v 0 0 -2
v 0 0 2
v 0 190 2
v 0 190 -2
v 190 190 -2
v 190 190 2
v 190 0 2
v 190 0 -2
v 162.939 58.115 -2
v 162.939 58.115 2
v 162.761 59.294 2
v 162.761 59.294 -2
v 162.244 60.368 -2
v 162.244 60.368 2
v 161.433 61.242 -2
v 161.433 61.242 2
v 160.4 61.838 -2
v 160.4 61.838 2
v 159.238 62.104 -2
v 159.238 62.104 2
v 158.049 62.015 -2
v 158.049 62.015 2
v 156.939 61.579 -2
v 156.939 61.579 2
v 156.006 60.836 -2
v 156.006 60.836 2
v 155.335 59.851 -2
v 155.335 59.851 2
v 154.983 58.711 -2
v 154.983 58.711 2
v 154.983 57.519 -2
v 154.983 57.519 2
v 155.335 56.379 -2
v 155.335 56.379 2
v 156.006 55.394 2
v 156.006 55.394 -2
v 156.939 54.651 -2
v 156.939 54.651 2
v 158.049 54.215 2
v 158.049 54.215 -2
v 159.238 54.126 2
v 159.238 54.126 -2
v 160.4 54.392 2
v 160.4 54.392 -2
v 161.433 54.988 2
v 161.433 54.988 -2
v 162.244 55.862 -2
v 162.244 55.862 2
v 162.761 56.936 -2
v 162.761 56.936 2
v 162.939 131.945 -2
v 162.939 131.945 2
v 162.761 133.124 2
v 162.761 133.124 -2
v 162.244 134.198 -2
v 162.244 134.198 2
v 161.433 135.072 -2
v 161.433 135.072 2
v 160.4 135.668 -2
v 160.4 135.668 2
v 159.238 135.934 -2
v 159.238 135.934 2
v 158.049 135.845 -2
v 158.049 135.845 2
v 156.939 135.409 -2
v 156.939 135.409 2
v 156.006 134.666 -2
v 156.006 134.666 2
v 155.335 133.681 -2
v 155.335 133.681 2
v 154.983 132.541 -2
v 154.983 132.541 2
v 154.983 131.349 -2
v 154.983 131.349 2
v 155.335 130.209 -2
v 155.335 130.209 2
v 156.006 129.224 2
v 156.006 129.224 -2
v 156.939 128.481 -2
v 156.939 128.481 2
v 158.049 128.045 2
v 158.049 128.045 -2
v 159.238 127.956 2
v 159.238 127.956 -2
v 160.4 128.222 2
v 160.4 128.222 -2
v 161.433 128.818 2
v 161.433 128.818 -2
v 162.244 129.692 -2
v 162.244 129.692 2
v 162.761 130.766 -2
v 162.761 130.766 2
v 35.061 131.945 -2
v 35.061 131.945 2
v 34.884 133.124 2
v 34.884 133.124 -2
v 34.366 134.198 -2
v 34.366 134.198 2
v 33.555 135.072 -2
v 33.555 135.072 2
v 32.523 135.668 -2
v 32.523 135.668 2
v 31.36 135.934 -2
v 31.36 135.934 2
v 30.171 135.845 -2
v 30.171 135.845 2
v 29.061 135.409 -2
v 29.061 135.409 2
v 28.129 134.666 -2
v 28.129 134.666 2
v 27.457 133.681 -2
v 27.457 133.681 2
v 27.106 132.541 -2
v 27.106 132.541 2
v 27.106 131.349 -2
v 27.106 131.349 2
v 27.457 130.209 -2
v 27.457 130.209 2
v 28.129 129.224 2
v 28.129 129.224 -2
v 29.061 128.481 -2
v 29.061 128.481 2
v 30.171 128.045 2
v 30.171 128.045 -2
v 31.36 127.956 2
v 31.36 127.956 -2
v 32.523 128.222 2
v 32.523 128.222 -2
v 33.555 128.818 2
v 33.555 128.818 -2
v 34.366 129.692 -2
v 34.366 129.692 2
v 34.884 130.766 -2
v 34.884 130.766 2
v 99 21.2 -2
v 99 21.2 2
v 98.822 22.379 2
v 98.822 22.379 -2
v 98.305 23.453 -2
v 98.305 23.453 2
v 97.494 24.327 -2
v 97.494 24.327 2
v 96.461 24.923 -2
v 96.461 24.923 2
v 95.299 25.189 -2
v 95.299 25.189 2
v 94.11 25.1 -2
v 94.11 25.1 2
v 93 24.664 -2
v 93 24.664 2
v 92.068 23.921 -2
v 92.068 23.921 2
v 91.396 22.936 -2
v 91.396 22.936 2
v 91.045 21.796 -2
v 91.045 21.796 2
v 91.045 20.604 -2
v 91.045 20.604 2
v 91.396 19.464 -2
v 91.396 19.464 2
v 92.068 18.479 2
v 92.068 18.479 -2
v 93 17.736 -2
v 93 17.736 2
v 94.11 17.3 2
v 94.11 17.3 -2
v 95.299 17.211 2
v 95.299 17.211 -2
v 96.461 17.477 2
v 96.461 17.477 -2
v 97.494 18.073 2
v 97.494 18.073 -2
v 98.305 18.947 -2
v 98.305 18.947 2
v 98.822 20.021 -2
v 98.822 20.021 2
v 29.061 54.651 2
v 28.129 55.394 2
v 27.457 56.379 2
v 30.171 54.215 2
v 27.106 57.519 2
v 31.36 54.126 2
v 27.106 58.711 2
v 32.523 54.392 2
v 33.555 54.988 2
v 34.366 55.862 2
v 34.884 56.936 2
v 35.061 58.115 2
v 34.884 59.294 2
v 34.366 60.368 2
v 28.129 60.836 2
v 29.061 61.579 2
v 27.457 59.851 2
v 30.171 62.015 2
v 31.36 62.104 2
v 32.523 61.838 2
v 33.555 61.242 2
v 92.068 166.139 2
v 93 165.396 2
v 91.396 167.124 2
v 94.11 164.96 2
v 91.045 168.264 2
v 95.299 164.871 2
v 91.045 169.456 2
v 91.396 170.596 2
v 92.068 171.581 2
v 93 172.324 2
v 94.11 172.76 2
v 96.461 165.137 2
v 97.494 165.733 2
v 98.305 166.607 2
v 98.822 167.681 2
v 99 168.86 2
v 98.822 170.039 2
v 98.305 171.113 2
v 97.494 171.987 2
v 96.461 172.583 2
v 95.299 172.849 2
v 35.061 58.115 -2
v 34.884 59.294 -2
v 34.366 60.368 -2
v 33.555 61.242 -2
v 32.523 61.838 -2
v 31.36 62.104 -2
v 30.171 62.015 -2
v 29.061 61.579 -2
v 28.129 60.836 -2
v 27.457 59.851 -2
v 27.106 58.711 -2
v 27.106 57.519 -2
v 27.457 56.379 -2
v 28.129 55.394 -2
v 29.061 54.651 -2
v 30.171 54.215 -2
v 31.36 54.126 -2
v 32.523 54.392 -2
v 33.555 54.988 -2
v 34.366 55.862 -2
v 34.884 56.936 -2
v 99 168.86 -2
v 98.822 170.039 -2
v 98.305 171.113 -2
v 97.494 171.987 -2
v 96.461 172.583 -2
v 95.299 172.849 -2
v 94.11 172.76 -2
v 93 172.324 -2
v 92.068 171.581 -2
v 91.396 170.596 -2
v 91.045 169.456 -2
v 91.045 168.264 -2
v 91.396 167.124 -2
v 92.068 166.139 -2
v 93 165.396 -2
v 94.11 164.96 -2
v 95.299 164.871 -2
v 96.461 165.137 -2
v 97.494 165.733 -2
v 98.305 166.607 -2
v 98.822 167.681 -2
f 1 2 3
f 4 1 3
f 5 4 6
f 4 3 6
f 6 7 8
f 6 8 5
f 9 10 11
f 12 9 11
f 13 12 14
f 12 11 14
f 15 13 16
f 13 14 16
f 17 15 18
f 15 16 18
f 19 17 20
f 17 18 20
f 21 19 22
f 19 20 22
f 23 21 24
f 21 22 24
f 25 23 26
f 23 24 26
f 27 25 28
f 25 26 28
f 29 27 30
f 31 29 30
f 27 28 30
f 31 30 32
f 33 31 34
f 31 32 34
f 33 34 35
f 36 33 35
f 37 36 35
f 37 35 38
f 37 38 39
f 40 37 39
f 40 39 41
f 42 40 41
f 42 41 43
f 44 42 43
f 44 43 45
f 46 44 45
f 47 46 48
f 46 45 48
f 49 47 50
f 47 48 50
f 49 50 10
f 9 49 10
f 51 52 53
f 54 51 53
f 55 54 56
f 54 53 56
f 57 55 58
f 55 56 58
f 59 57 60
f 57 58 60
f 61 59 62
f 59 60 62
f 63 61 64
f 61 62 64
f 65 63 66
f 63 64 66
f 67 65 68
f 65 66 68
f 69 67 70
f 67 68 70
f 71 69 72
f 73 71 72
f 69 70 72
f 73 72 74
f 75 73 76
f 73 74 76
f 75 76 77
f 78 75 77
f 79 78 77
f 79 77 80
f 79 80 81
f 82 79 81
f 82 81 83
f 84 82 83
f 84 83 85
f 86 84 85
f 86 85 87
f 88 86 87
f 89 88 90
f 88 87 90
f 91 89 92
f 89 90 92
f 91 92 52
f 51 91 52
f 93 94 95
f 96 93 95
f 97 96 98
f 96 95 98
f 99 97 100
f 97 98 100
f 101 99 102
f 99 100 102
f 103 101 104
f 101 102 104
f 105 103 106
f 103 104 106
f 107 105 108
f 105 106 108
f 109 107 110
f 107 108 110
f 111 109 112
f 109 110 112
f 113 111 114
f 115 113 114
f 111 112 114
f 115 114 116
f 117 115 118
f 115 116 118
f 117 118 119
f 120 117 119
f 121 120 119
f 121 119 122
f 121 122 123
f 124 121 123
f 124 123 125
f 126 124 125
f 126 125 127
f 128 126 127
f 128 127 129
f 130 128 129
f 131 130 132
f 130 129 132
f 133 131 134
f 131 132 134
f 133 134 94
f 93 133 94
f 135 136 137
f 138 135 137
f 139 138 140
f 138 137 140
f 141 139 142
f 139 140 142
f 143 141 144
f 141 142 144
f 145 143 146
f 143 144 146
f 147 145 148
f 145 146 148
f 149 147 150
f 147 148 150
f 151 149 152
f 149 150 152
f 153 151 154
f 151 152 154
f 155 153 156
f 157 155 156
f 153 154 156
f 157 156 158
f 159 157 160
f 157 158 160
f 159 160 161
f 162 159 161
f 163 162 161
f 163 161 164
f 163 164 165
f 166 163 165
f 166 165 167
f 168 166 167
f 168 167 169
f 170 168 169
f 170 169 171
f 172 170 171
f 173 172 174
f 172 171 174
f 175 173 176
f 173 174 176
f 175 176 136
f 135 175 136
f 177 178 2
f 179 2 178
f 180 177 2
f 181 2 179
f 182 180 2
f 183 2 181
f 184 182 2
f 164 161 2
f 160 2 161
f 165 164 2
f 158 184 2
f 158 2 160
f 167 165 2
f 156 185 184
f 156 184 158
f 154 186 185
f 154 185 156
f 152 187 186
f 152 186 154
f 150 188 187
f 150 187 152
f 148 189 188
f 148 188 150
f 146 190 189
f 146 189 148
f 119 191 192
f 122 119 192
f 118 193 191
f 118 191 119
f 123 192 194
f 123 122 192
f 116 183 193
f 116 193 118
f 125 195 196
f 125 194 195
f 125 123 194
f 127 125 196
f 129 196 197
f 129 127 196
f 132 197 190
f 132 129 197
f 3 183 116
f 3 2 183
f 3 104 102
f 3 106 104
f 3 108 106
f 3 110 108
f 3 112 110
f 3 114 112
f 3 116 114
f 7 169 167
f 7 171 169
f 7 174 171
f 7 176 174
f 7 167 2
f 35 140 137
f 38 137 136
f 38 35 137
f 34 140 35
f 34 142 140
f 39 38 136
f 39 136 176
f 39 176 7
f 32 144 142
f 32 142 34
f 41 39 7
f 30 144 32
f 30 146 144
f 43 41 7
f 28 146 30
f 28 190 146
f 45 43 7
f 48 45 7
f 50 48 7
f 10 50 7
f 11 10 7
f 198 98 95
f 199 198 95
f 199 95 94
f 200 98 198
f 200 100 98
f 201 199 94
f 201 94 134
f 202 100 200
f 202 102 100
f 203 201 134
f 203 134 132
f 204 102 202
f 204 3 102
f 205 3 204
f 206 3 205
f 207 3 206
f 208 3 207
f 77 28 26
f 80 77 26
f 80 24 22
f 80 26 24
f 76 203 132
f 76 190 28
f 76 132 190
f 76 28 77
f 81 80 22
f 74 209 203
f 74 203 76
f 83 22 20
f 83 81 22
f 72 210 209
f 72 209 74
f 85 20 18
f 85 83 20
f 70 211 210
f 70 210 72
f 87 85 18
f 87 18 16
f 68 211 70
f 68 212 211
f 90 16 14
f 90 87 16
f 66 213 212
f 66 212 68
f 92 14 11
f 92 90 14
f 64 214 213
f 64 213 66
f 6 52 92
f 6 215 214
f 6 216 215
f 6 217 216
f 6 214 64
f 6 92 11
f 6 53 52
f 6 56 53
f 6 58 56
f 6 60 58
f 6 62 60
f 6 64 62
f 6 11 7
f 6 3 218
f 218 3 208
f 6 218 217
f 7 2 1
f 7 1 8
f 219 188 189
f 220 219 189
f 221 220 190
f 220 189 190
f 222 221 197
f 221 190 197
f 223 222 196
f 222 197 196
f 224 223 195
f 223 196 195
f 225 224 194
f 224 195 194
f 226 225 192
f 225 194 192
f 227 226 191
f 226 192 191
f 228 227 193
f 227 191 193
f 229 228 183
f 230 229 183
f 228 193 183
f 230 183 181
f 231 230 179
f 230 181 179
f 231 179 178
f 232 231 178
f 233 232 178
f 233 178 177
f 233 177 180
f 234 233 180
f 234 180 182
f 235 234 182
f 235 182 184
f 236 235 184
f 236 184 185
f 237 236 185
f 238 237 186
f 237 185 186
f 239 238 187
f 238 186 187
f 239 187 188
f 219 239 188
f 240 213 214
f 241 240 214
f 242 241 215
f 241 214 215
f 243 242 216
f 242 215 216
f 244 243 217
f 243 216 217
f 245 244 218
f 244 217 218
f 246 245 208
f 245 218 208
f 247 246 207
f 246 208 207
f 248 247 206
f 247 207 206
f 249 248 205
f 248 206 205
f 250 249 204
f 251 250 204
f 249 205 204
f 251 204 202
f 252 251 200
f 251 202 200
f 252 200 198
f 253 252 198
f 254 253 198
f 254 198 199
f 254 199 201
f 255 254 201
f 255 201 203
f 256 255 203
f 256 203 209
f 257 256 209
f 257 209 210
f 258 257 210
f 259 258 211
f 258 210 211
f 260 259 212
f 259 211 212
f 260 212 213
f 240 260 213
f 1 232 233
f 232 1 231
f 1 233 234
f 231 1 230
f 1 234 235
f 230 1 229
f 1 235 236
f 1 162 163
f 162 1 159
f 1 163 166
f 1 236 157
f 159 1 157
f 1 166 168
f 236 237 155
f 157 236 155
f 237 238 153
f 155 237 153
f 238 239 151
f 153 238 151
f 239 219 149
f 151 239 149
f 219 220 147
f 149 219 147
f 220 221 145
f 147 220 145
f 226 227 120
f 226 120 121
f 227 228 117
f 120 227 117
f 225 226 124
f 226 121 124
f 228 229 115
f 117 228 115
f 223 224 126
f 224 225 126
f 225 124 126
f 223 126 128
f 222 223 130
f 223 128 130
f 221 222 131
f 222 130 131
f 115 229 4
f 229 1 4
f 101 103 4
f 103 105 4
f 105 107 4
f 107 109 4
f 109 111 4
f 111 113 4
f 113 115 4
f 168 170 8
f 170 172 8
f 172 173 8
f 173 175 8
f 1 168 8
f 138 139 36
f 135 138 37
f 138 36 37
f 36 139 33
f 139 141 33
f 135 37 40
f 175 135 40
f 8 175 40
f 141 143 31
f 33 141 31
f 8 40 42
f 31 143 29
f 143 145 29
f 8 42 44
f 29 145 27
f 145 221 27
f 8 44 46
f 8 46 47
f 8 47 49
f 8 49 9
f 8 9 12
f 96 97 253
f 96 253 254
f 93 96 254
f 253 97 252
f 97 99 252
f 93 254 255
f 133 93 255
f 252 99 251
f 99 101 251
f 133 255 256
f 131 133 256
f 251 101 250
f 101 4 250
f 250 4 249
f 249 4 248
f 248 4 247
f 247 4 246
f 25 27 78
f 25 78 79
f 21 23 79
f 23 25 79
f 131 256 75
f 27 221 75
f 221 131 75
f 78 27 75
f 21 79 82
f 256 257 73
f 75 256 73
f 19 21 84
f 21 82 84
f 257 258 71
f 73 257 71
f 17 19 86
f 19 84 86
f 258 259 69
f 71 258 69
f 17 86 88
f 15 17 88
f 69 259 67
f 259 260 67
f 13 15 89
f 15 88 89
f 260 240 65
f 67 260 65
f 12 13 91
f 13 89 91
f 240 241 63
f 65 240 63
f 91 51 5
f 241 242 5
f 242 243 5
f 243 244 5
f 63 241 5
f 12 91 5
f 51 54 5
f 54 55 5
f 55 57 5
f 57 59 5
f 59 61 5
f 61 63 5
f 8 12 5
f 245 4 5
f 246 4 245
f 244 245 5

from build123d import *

# Parameters (mm, degrees)
CROQUIS1_W              = 190
CROQUIS1_H              = 190
SALIENTE_EXTRUIR1_DEPTH = 2
CROQUIS2_R              = 4
CORTAR_EXTRUIR2_DEPTH   = 4


with BuildPart() as part:
    # Croquis1 → Saliente-Extruir1 (new, symmetric)
    with BuildSketch(Plane.XY):
        with Locations((95, 95)):
            Rectangle(CROQUIS1_W, CROQUIS1_H)
    extrude(amount=SALIENTE_EXTRUIR1_DEPTH, both=True)

    # Croquis2 → Cortar-Extruir2 (cut)
    with BuildSketch(Plane.XY.offset(2)):
        with Locations((95, 168.86)):
            Circle(CROQUIS2_R)
        with Locations((158.938655561, 131.945)):
            Circle(CROQUIS2_R)
        with Locations((158.938655561, 58.115)):
            Circle(CROQUIS2_R)
        with Locations((95, 21.2)):
            Circle(CROQUIS2_R)
        with Locations((31.061344439, 58.115)):
            Circle(CROQUIS2_R)
        with Locations((31.061344439, 131.945)):
            Circle(CROQUIS2_R)
    extrude(amount=-CORTAR_EXTRUIR2_DEPTH, mode=Mode.SUBTRACT)


solid = part.part
